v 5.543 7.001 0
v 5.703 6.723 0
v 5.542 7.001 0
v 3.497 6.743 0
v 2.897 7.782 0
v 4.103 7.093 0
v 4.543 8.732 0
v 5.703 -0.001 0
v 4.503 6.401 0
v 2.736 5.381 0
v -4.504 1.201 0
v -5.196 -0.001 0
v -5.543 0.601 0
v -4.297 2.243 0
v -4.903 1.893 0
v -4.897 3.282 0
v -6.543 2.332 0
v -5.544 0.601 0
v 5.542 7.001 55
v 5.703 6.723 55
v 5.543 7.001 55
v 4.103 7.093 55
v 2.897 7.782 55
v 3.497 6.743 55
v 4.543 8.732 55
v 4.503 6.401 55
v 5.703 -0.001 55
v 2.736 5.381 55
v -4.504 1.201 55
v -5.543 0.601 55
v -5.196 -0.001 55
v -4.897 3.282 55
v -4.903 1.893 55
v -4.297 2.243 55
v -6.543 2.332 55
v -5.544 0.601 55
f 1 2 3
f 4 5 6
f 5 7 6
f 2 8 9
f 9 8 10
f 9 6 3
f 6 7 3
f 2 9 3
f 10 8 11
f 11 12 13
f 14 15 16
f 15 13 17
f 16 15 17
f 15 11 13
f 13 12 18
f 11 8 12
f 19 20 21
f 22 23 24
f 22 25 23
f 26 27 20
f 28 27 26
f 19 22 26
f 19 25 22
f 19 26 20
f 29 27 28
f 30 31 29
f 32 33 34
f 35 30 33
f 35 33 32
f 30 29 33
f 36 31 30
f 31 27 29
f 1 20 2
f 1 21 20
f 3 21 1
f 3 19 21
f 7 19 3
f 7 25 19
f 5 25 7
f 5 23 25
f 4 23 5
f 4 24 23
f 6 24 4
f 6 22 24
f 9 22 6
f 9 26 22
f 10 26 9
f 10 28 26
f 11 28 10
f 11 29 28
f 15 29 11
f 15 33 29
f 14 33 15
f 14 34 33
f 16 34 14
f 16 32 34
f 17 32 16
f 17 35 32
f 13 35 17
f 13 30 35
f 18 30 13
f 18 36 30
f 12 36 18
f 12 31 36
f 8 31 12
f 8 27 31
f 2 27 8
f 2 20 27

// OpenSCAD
height=55;
hollow="no"; // [yes,no]
rail_wall=0.8;

strip_width=10;
strip_clearence=0.2;
strip_border_height=2;
strip_border_width=1.2;
strip_hook_width=0.7;
strip_thickness=0.8;

angle=30;
offset_y=0;

/* [Hidden] */

// FIXME: offset_x should be 0
offset_x=0;

rail_width=strip_width+2*strip_clearence+2*strip_border_width;
rail_base_width=max(rail_width*cos(angle),0);
strip_holder_min_raise = strip_border_width*(1-sin(angle));

module strip_holder_shape() {
    x1=rail_width/2-strip_border_width;
    y2=strip_thickness;
    x3=x1-strip_hook_width;
    y4=strip_border_height;
    x5=rail_width/2;

    polygon([
        [-x1,0.001],
        [-x1,y2],
        [-x3,y2],
        [-x3,y4],
        [-x5,y4],
        [-x5,-0.001],

        [x5,-0.001],
        [x5,y4],
        [x3,y4],
        [x3,y2],
        [x1,y2],
        [x1,0.001],
    ]);
}

module rail_base_shape() {
    ay=max(strip_holder_min_raise,offset_y);
    x1=rail_width/2;
    x2=x1-ay*tan(angle);
    x5=rail_base_width-x1;
    y5=rail_width*sin(angle);
    x3=x5+strip_border_width*(1-cos(angle));
    by=angle==0?0:strip_border_width*(1-cos(angle))/tan(angle);
    y4=y5-by;

    polygon([
        [-x1+offset_x-0.001,ay+0.001],
        [-x2,-0.001],
        [x3,-0.001],
        [x3,y4+ay+0.001],
        [x5,y5+ay+0.001]
    ]);
}

module rail_shape() {
    translate([rail_width/2-rail_base_width/2,0]) {
        translate([-rail_width/2+offset_x,max(strip_holder_min_raise,offset_y)])
            rotate(angle)
                translate([rail_width/2,0])
                    strip_holder_shape();
        
        rail_base_shape();
    }
}

module rail() {
    if (height>0) {
        linear_extrude(height=height) {
            difference() {
                rail_shape();
                if (hollow=="yes")
                    offset(-rail_wall)
                        rail_shape();
            }
        }
    } else {
        difference() {
            rail_shape();
            if (hollow=="yes")
                offset(-rail_wall)
                    rail_shape();
        }
    }
}

rail();
